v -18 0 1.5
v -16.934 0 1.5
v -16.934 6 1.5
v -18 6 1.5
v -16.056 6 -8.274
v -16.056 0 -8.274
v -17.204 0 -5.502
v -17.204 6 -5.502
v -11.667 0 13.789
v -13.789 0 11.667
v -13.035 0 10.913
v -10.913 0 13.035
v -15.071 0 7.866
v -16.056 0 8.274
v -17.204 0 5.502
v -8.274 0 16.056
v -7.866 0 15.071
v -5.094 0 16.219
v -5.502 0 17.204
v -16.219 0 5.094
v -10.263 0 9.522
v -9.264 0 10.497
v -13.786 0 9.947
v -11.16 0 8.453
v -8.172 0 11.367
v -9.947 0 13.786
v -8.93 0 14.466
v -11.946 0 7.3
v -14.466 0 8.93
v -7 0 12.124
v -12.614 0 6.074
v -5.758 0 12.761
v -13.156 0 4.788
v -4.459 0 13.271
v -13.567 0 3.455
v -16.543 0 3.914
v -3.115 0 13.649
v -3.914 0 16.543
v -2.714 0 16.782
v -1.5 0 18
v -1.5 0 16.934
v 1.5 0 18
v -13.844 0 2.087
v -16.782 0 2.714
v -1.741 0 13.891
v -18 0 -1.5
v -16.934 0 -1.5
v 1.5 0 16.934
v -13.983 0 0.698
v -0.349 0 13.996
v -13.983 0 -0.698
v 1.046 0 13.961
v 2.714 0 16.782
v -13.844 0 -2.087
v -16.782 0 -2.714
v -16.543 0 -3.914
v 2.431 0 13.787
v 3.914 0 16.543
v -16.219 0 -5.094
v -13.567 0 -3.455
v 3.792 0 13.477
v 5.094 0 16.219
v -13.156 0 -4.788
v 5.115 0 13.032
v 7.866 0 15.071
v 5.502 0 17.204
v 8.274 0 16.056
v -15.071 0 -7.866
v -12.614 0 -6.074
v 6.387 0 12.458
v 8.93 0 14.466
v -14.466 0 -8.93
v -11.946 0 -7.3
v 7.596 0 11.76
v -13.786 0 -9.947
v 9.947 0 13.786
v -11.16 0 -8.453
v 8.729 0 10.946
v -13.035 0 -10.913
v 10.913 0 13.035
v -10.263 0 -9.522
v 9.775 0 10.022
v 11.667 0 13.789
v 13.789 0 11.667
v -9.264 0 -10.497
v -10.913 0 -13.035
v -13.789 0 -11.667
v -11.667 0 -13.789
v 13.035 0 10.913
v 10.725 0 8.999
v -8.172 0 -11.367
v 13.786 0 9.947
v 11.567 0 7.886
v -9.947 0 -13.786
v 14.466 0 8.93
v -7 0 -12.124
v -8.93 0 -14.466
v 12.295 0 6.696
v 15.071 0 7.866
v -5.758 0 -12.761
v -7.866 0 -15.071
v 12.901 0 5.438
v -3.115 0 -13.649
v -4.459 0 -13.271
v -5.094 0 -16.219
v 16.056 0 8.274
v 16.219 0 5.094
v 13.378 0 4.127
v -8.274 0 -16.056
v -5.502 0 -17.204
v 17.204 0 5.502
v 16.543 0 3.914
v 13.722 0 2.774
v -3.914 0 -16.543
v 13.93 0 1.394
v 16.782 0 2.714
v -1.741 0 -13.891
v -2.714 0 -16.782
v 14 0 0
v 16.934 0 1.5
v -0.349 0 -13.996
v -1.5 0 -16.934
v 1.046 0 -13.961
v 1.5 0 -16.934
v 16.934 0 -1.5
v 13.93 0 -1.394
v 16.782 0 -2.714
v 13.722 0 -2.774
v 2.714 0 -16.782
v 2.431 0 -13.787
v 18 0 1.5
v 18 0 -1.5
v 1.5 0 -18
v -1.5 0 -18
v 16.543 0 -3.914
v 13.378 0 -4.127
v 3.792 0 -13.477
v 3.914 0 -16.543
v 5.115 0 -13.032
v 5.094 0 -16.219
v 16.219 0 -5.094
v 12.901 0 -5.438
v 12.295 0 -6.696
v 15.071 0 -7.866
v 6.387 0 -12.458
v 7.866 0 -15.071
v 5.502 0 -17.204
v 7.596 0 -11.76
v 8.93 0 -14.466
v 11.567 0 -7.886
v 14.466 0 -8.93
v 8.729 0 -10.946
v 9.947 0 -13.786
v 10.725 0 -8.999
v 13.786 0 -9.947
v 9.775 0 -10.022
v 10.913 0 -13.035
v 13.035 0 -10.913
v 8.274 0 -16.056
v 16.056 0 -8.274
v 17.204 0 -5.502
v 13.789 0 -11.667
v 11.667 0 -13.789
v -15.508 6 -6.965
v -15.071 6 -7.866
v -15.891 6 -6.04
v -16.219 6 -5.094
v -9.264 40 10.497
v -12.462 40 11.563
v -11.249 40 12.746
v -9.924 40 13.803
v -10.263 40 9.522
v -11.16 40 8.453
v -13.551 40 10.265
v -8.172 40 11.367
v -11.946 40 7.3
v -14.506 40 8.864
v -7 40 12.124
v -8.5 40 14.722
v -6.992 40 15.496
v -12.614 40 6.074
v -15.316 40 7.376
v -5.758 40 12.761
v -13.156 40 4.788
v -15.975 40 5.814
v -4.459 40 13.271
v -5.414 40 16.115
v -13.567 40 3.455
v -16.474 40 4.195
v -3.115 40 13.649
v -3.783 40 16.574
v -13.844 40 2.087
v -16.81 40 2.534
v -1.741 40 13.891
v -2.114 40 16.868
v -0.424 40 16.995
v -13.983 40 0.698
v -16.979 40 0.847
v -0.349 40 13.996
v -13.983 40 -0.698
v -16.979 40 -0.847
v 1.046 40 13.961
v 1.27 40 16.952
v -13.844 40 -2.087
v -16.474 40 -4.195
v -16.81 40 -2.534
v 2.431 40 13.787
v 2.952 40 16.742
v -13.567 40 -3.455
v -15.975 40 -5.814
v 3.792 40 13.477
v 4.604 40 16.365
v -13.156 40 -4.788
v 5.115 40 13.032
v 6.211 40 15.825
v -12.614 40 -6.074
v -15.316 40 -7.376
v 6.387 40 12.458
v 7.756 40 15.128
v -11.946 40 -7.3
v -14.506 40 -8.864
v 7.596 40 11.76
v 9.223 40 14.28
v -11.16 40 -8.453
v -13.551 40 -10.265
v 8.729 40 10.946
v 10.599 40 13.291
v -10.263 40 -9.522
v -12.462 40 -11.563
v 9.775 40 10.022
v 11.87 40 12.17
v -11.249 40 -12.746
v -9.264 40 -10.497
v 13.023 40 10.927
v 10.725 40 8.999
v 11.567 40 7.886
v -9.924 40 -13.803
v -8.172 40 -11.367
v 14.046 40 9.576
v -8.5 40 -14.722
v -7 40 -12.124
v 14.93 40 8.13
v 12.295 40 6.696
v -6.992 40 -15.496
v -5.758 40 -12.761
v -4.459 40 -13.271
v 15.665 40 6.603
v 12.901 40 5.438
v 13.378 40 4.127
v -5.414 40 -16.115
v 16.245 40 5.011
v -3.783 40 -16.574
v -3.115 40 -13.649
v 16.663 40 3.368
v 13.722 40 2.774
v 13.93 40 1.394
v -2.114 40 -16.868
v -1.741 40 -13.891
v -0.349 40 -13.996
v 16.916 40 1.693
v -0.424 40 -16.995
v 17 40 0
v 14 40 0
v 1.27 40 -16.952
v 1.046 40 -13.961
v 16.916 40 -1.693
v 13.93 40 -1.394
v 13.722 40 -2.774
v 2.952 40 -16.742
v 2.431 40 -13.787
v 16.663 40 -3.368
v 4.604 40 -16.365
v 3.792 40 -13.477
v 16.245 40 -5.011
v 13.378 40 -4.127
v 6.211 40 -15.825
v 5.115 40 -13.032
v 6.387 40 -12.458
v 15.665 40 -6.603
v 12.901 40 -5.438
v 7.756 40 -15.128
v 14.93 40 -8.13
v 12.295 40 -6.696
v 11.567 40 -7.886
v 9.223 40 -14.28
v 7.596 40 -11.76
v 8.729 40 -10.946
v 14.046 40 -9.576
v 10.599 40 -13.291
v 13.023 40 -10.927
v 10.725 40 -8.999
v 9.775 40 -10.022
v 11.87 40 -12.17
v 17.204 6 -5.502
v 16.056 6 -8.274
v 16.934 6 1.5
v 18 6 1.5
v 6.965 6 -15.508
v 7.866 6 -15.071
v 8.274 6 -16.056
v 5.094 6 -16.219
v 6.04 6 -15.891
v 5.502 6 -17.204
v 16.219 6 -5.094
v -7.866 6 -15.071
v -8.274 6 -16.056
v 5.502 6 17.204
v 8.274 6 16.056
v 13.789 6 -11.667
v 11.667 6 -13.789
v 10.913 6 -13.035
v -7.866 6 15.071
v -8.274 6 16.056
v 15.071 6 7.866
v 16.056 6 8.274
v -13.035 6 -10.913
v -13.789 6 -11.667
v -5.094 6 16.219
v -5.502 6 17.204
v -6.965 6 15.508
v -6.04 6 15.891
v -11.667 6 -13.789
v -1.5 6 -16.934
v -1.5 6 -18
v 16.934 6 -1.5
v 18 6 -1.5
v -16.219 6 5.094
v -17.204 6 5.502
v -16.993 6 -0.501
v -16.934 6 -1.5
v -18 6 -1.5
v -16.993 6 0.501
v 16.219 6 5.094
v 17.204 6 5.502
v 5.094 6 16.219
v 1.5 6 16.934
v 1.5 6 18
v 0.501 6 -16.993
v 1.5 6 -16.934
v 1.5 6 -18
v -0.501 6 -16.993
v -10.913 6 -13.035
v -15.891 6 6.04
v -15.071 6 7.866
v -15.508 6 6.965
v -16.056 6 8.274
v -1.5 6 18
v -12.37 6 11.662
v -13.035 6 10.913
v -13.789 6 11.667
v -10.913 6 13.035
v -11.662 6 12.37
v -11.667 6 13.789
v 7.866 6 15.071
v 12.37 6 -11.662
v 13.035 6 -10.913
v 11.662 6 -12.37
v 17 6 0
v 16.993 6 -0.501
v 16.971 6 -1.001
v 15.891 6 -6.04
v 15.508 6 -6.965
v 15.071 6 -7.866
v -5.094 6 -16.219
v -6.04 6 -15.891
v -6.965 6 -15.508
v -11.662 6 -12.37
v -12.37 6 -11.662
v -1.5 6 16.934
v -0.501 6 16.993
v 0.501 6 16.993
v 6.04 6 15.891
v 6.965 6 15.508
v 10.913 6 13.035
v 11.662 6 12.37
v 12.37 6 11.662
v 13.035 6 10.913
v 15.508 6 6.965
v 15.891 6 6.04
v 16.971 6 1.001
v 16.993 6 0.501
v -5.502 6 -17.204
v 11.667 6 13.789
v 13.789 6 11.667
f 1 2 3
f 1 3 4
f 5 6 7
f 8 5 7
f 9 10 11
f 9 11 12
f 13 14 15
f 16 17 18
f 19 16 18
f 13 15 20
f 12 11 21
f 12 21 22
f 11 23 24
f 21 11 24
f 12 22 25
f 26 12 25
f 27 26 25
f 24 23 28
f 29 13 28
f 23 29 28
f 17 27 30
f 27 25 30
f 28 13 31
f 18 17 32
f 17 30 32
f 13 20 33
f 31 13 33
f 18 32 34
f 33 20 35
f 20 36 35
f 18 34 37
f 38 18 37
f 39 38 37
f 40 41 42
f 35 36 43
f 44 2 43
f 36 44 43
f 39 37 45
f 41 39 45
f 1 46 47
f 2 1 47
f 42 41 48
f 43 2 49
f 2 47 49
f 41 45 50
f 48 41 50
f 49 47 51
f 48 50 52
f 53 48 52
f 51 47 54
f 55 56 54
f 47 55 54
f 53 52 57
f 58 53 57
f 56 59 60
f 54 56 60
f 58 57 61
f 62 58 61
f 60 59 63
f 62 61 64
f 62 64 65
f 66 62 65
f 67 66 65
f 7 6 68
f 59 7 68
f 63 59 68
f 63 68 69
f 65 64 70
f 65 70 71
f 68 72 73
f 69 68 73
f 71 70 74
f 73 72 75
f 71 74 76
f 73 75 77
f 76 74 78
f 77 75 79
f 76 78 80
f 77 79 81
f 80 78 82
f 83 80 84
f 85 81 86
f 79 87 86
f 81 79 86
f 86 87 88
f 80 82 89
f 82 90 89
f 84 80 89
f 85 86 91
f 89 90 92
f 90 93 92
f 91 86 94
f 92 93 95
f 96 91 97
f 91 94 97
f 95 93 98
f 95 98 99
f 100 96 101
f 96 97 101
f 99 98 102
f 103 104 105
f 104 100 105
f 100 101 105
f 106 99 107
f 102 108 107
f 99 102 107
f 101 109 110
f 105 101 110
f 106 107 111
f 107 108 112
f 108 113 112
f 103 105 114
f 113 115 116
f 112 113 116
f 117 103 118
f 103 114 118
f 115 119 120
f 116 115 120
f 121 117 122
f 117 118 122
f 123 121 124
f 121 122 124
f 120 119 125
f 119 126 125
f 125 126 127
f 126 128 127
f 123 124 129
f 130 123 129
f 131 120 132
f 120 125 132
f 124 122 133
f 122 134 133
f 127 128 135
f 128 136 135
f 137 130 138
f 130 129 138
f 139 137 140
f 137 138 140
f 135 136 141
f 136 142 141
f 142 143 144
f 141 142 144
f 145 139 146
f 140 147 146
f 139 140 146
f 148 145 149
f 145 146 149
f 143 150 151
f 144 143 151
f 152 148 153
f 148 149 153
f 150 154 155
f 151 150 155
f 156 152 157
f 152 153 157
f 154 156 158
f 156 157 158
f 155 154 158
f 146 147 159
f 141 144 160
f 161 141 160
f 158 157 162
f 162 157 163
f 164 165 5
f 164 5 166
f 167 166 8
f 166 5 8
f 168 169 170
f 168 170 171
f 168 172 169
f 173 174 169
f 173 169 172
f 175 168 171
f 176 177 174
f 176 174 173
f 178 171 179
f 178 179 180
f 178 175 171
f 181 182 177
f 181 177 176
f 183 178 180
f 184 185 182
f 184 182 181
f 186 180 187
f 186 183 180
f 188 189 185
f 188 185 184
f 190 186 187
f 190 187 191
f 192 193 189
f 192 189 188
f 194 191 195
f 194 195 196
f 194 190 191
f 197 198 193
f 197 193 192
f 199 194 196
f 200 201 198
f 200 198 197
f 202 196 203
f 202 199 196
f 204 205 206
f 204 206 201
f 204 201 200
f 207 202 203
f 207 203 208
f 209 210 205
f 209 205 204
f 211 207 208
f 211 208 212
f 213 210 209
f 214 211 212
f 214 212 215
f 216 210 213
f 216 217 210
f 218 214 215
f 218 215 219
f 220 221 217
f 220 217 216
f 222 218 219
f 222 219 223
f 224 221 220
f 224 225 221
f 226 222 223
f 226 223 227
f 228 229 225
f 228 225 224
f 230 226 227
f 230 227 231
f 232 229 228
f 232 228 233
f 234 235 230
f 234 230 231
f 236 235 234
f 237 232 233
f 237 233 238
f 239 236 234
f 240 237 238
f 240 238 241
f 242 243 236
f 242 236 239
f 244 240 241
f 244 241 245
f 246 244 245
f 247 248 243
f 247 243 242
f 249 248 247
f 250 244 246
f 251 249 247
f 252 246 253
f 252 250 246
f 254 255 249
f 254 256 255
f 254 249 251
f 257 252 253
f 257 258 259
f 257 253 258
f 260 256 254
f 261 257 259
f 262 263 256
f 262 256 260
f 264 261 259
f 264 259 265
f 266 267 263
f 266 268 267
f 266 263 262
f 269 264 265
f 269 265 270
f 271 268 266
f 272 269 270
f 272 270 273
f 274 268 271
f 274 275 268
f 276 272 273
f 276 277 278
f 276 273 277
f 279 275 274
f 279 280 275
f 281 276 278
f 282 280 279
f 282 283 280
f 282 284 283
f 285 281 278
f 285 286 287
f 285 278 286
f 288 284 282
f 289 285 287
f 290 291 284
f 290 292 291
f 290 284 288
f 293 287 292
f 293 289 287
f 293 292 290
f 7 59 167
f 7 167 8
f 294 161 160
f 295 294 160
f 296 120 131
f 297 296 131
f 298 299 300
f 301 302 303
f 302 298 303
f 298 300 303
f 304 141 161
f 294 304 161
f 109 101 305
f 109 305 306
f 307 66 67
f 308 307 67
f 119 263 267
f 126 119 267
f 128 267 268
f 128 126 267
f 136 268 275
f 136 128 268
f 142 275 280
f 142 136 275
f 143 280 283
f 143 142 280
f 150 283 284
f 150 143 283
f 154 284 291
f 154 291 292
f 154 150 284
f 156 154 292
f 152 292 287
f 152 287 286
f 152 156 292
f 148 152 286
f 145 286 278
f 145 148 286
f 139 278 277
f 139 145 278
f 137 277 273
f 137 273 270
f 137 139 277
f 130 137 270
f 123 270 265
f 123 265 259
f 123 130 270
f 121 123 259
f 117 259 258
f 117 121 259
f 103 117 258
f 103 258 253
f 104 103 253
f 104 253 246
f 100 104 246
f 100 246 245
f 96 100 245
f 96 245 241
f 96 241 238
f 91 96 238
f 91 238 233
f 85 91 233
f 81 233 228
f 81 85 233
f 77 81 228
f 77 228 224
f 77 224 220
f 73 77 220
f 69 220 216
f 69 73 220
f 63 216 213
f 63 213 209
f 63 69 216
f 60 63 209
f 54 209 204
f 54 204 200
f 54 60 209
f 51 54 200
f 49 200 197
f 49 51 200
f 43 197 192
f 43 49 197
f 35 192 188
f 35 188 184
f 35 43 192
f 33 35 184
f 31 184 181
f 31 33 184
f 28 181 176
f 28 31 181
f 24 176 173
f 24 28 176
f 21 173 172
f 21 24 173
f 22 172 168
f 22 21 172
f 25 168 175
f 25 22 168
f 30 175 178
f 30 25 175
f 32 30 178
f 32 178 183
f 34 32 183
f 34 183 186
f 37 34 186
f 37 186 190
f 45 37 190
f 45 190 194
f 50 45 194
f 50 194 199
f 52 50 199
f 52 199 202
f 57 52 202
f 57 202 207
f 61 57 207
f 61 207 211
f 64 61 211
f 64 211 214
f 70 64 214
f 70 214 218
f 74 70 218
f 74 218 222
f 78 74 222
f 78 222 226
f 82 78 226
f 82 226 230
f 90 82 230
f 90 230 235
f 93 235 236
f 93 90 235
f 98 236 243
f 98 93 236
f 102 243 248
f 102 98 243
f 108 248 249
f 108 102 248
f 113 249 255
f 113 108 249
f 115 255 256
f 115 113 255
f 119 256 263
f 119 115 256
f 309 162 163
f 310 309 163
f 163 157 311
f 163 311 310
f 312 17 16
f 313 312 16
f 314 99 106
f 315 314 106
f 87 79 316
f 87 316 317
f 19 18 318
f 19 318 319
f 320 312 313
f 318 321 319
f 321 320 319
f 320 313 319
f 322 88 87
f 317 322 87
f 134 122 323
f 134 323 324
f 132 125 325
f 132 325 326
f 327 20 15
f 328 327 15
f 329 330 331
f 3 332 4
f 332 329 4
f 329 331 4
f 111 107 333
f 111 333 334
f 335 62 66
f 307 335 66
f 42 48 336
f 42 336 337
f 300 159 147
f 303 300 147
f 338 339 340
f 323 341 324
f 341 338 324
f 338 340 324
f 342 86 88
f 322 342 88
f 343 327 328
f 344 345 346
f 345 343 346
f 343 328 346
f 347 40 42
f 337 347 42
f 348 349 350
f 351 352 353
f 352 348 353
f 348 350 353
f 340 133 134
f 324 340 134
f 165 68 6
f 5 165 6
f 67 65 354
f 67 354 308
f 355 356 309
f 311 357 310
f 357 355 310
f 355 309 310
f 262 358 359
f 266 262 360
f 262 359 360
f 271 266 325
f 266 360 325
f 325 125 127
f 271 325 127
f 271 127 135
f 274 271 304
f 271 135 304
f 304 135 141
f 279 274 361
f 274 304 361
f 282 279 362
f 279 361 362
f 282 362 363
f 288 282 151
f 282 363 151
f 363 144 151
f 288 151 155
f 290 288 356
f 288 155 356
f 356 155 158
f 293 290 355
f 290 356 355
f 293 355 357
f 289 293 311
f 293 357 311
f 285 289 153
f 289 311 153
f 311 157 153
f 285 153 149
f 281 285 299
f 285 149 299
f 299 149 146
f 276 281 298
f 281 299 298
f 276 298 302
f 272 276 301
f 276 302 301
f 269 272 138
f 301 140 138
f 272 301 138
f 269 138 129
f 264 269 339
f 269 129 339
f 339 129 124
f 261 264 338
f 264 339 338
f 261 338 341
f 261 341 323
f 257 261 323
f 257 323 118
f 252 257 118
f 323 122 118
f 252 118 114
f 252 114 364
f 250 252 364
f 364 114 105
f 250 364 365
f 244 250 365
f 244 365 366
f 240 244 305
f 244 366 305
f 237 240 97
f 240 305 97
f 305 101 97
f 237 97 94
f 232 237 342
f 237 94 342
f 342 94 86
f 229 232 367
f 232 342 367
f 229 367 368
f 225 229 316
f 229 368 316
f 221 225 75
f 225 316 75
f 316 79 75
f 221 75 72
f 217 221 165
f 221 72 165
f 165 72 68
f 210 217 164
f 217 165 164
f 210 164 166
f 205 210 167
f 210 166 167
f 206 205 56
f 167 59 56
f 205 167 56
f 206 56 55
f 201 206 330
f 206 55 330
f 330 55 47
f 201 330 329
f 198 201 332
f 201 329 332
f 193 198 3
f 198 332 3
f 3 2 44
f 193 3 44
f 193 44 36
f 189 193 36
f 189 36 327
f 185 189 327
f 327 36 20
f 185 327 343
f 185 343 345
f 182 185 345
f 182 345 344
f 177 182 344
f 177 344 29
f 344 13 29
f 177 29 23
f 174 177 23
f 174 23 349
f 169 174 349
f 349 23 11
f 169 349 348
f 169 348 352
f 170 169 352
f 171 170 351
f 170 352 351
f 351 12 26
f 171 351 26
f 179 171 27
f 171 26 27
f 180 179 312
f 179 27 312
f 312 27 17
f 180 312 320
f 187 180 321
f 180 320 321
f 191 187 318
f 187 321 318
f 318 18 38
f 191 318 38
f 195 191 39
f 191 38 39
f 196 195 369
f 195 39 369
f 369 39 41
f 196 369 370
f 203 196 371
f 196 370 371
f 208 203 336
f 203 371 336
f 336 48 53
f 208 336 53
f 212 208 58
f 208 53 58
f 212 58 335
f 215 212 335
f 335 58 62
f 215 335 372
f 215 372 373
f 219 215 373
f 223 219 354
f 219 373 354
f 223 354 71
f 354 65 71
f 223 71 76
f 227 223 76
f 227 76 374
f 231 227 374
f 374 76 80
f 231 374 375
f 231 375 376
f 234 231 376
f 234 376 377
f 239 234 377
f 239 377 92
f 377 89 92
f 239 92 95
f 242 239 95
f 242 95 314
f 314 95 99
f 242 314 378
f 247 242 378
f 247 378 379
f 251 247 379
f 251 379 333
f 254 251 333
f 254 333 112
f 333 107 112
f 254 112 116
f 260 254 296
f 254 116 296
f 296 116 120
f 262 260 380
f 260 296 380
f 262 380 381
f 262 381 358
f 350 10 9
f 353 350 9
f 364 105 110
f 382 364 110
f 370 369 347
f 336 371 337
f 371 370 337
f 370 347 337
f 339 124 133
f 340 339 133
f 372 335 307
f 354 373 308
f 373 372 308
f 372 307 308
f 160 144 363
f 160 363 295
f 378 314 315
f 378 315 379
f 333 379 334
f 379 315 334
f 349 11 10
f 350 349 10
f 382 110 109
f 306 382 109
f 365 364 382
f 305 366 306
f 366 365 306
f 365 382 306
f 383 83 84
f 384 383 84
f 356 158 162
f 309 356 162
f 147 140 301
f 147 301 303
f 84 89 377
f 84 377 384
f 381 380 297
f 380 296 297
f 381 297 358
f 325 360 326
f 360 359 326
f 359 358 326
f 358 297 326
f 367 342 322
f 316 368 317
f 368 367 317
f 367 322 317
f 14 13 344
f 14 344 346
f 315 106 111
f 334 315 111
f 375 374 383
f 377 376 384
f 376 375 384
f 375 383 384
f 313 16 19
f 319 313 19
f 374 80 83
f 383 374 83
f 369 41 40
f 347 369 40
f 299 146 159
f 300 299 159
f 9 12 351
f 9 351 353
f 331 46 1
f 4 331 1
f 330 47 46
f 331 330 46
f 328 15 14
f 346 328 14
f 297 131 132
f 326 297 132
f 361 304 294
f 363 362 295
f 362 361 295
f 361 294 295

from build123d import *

# Parameters (mm, degrees)
SKETCH_1_R               = 17
SKETCH_1_R_2             = 14
EXTRUDE_1_DEPTH          = 40
SKETCH_2_W               = 3
SKETCH_2_H               = 2
EXTRUDE_2_DEPTH          = 6
PATTERN_CIRCULAR_1_COUNT = 16


with BuildPart() as part:
    # 草图1 → 凸台-拉伸1 (new body)
    with BuildSketch(Plane(origin=(0, 0, 0), x_dir=(1, 0, 0), z_dir=(0, 1, 0))):
        Circle(SKETCH_1_R)
        Circle(SKETCH_1_R_2, mode=Mode.SUBTRACT)
    extrude(amount=EXTRUDE_1_DEPTH)

    # 草图2 → 凸台-拉伸2 (add)
    with BuildSketch(Plane(origin=(0, 0, 0), x_dir=(-1, 0, 0), z_dir=(0, -1, 0))):
        with Locations((0, 17)):
            Rectangle(SKETCH_2_W, SKETCH_2_H)
    extrude_2 = extrude(amount=-EXTRUDE_2_DEPTH)

    # 阵列(圆周)1: 凸台-拉伸2 ×16 about axis
    pattern_circular_1_axis = Axis((0, 0, 0), (0, 1, 0))
    for i in range(1, PATTERN_CIRCULAR_1_COUNT):
        add(extrude_2.rotate(pattern_circular_1_axis, i * 360 / PATTERN_CIRCULAR_1_COUNT))


solid = part.part
